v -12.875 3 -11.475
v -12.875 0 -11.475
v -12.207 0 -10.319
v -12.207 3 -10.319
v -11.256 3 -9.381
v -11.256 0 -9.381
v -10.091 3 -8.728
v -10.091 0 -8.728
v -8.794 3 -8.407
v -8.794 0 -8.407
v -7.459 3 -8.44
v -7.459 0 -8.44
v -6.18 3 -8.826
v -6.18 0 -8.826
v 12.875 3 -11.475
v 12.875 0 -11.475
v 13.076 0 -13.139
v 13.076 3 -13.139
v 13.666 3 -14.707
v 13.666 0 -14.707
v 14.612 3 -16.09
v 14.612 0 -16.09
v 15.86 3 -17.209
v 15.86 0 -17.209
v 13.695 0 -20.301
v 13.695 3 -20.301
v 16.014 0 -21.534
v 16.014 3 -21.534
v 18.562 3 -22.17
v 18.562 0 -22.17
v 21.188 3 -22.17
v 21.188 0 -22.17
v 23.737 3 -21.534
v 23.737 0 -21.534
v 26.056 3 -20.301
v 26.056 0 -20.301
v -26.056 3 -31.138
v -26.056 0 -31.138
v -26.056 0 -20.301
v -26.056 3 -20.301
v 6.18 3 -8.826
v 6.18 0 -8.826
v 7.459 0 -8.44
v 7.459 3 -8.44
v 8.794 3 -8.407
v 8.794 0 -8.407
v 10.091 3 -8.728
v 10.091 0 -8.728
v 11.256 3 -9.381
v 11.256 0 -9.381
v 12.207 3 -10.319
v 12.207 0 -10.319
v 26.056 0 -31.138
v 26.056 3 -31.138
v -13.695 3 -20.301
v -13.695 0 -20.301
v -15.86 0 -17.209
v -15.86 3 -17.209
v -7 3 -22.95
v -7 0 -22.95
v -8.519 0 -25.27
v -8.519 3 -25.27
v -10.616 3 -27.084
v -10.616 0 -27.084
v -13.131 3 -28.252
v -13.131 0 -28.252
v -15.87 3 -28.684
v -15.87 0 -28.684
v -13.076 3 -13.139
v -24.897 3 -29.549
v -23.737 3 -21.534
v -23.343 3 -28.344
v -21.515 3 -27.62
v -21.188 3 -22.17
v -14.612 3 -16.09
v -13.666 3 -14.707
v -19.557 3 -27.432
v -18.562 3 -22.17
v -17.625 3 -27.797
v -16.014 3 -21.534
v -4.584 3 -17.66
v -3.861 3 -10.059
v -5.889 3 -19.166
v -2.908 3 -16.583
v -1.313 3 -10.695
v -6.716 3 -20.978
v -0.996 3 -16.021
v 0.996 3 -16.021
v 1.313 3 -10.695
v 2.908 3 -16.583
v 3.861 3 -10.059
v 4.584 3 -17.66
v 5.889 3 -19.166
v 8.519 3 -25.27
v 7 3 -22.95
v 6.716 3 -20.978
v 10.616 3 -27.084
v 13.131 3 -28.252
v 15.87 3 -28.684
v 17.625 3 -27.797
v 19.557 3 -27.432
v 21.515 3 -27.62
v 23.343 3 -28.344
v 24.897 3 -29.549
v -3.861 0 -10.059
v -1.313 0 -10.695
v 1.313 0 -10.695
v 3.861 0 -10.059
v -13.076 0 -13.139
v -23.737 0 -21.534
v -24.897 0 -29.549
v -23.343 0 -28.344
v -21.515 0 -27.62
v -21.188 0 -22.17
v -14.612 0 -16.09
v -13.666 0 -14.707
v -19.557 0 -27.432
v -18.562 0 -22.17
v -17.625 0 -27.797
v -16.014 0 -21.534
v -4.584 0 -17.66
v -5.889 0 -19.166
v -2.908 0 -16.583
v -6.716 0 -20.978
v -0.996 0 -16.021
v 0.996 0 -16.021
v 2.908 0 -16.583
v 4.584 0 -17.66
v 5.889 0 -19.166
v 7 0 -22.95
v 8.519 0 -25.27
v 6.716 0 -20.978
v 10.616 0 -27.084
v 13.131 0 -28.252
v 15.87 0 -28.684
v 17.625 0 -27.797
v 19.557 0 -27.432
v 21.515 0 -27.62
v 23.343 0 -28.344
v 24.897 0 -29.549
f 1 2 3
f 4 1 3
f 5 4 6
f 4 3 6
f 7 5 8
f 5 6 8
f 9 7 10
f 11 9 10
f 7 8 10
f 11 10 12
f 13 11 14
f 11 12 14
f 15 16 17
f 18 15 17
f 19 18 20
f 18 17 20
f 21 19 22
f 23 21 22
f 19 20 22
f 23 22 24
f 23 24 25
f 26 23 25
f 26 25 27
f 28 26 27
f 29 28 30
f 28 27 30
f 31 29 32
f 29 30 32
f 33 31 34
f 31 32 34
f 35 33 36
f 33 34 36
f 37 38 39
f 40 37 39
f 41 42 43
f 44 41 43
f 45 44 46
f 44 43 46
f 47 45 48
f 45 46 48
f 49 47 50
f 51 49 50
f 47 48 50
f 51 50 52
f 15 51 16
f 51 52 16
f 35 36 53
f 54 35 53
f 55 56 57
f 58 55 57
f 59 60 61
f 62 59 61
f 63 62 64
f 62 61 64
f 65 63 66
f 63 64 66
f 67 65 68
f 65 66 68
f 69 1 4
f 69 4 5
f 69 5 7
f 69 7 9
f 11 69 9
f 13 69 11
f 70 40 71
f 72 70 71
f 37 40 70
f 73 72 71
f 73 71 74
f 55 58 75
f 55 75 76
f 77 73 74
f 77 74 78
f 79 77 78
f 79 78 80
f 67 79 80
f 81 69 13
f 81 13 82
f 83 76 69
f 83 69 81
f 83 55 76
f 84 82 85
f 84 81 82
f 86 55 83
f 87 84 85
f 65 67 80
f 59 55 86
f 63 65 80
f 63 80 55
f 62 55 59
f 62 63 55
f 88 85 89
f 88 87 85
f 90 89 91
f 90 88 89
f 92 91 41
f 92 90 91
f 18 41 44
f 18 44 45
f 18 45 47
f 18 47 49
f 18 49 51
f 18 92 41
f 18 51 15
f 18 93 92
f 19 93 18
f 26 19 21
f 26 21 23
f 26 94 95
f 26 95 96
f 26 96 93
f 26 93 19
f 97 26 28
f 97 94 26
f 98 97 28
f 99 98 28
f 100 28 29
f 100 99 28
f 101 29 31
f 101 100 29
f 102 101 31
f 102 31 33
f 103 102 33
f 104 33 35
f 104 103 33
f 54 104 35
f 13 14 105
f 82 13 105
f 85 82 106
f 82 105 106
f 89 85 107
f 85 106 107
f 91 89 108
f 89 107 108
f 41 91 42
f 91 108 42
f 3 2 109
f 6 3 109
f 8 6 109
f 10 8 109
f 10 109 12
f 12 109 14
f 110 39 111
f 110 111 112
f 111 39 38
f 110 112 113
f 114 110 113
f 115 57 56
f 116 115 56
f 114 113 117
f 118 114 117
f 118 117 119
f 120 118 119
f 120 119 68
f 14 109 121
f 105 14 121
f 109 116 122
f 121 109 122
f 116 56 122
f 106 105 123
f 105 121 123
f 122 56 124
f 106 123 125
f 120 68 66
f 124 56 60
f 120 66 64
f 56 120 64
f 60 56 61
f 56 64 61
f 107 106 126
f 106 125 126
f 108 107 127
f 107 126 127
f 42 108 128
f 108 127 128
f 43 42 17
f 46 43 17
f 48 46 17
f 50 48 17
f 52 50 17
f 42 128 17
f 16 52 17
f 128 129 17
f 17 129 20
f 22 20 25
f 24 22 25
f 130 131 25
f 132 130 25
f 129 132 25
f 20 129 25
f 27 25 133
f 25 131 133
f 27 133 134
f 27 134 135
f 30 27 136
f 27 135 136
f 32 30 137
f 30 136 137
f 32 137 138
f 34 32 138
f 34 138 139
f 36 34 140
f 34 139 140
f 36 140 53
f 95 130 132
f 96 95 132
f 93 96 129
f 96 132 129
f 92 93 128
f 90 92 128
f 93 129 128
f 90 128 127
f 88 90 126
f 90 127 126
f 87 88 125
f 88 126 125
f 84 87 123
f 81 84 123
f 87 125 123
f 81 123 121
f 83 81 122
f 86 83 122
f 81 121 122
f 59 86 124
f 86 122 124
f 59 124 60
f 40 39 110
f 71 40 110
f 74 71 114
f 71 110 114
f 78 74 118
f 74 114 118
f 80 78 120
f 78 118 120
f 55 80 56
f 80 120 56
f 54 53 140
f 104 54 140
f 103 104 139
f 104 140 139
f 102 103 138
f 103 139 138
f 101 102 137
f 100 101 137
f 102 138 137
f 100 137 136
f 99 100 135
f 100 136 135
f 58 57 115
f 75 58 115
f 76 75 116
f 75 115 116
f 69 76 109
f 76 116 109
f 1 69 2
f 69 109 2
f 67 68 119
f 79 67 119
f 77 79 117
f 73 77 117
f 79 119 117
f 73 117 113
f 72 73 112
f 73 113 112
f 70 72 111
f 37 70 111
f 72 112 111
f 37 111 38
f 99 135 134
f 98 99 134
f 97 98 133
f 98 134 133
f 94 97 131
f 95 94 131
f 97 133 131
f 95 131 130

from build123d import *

# Parameters (mm, degrees)
BOSS_EXTRUDE1_DEPTH = 3


with BuildPart() as part:
    # Sketch3 → Boss-Extrude1 (new body)
    with BuildSketch(Plane(origin=(0, 0, 0), x_dir=(1, 0, 0), z_dir=(0, 1, 0))):
        with BuildLine():
            Line((-13.694996915, 20.301363277), (-15.860247962, 17.20906431))
            ThreePointArc((-15.860247962, 17.20906431), (-13.666207185, 14.707240293), (-12.875283017, 11.475))
            ThreePointArc((-12.875283017, 11.475), (-10.090653959, 8.727908609), (-6.180286102, 8.826363277))
            ThreePointArc((-6.180286102, 8.826363277), (0, 10.775), (6.180286102, 8.826363277))
            ThreePointArc((6.180286102, 8.826363277), (10.090653959, 8.727908609), (12.875283017, 11.475))
            ThreePointArc((12.875283017, 11.475), (13.666207185, 14.707240293), (15.860247962, 17.20906431))
            Line((15.860247962, 17.20906431), (13.694996915, 20.301363277))
            ThreePointArc((13.694996915, 20.301363277), (19.875283017, 22.25), (26.055569119, 20.301363277))
            Line((26.055569119, 20.301363277), (26.055569119, 31.138046441))
            ThreePointArc((26.055569119, 31.138046441), (21.514872246, 27.619726518), (15.870079226, 28.68406431))
            ThreePointArc((15.870079226, 28.68406431), (10.616247764, 27.083629141), (7, 22.95))
            ThreePointArc((7, 22.95), (0, 15.95), (-7, 22.95))
            ThreePointArc((-7, 22.95), (-10.616247764, 27.083629141), (-15.870079226, 28.68406431))
            ThreePointArc((-15.870079226, 28.68406431), (-21.514872246, 27.619726518), (-26.055569119, 31.138046441))
            Line((-26.055569119, 31.138046441), (-26.055569119, 20.301363277))
            ThreePointArc((-26.055569119, 20.301363277), (-19.875283017, 22.25), (-13.694996915, 20.301363277))
        make_face()
    extrude(amount=BOSS_EXTRUDE1_DEPTH)


solid = part.part
